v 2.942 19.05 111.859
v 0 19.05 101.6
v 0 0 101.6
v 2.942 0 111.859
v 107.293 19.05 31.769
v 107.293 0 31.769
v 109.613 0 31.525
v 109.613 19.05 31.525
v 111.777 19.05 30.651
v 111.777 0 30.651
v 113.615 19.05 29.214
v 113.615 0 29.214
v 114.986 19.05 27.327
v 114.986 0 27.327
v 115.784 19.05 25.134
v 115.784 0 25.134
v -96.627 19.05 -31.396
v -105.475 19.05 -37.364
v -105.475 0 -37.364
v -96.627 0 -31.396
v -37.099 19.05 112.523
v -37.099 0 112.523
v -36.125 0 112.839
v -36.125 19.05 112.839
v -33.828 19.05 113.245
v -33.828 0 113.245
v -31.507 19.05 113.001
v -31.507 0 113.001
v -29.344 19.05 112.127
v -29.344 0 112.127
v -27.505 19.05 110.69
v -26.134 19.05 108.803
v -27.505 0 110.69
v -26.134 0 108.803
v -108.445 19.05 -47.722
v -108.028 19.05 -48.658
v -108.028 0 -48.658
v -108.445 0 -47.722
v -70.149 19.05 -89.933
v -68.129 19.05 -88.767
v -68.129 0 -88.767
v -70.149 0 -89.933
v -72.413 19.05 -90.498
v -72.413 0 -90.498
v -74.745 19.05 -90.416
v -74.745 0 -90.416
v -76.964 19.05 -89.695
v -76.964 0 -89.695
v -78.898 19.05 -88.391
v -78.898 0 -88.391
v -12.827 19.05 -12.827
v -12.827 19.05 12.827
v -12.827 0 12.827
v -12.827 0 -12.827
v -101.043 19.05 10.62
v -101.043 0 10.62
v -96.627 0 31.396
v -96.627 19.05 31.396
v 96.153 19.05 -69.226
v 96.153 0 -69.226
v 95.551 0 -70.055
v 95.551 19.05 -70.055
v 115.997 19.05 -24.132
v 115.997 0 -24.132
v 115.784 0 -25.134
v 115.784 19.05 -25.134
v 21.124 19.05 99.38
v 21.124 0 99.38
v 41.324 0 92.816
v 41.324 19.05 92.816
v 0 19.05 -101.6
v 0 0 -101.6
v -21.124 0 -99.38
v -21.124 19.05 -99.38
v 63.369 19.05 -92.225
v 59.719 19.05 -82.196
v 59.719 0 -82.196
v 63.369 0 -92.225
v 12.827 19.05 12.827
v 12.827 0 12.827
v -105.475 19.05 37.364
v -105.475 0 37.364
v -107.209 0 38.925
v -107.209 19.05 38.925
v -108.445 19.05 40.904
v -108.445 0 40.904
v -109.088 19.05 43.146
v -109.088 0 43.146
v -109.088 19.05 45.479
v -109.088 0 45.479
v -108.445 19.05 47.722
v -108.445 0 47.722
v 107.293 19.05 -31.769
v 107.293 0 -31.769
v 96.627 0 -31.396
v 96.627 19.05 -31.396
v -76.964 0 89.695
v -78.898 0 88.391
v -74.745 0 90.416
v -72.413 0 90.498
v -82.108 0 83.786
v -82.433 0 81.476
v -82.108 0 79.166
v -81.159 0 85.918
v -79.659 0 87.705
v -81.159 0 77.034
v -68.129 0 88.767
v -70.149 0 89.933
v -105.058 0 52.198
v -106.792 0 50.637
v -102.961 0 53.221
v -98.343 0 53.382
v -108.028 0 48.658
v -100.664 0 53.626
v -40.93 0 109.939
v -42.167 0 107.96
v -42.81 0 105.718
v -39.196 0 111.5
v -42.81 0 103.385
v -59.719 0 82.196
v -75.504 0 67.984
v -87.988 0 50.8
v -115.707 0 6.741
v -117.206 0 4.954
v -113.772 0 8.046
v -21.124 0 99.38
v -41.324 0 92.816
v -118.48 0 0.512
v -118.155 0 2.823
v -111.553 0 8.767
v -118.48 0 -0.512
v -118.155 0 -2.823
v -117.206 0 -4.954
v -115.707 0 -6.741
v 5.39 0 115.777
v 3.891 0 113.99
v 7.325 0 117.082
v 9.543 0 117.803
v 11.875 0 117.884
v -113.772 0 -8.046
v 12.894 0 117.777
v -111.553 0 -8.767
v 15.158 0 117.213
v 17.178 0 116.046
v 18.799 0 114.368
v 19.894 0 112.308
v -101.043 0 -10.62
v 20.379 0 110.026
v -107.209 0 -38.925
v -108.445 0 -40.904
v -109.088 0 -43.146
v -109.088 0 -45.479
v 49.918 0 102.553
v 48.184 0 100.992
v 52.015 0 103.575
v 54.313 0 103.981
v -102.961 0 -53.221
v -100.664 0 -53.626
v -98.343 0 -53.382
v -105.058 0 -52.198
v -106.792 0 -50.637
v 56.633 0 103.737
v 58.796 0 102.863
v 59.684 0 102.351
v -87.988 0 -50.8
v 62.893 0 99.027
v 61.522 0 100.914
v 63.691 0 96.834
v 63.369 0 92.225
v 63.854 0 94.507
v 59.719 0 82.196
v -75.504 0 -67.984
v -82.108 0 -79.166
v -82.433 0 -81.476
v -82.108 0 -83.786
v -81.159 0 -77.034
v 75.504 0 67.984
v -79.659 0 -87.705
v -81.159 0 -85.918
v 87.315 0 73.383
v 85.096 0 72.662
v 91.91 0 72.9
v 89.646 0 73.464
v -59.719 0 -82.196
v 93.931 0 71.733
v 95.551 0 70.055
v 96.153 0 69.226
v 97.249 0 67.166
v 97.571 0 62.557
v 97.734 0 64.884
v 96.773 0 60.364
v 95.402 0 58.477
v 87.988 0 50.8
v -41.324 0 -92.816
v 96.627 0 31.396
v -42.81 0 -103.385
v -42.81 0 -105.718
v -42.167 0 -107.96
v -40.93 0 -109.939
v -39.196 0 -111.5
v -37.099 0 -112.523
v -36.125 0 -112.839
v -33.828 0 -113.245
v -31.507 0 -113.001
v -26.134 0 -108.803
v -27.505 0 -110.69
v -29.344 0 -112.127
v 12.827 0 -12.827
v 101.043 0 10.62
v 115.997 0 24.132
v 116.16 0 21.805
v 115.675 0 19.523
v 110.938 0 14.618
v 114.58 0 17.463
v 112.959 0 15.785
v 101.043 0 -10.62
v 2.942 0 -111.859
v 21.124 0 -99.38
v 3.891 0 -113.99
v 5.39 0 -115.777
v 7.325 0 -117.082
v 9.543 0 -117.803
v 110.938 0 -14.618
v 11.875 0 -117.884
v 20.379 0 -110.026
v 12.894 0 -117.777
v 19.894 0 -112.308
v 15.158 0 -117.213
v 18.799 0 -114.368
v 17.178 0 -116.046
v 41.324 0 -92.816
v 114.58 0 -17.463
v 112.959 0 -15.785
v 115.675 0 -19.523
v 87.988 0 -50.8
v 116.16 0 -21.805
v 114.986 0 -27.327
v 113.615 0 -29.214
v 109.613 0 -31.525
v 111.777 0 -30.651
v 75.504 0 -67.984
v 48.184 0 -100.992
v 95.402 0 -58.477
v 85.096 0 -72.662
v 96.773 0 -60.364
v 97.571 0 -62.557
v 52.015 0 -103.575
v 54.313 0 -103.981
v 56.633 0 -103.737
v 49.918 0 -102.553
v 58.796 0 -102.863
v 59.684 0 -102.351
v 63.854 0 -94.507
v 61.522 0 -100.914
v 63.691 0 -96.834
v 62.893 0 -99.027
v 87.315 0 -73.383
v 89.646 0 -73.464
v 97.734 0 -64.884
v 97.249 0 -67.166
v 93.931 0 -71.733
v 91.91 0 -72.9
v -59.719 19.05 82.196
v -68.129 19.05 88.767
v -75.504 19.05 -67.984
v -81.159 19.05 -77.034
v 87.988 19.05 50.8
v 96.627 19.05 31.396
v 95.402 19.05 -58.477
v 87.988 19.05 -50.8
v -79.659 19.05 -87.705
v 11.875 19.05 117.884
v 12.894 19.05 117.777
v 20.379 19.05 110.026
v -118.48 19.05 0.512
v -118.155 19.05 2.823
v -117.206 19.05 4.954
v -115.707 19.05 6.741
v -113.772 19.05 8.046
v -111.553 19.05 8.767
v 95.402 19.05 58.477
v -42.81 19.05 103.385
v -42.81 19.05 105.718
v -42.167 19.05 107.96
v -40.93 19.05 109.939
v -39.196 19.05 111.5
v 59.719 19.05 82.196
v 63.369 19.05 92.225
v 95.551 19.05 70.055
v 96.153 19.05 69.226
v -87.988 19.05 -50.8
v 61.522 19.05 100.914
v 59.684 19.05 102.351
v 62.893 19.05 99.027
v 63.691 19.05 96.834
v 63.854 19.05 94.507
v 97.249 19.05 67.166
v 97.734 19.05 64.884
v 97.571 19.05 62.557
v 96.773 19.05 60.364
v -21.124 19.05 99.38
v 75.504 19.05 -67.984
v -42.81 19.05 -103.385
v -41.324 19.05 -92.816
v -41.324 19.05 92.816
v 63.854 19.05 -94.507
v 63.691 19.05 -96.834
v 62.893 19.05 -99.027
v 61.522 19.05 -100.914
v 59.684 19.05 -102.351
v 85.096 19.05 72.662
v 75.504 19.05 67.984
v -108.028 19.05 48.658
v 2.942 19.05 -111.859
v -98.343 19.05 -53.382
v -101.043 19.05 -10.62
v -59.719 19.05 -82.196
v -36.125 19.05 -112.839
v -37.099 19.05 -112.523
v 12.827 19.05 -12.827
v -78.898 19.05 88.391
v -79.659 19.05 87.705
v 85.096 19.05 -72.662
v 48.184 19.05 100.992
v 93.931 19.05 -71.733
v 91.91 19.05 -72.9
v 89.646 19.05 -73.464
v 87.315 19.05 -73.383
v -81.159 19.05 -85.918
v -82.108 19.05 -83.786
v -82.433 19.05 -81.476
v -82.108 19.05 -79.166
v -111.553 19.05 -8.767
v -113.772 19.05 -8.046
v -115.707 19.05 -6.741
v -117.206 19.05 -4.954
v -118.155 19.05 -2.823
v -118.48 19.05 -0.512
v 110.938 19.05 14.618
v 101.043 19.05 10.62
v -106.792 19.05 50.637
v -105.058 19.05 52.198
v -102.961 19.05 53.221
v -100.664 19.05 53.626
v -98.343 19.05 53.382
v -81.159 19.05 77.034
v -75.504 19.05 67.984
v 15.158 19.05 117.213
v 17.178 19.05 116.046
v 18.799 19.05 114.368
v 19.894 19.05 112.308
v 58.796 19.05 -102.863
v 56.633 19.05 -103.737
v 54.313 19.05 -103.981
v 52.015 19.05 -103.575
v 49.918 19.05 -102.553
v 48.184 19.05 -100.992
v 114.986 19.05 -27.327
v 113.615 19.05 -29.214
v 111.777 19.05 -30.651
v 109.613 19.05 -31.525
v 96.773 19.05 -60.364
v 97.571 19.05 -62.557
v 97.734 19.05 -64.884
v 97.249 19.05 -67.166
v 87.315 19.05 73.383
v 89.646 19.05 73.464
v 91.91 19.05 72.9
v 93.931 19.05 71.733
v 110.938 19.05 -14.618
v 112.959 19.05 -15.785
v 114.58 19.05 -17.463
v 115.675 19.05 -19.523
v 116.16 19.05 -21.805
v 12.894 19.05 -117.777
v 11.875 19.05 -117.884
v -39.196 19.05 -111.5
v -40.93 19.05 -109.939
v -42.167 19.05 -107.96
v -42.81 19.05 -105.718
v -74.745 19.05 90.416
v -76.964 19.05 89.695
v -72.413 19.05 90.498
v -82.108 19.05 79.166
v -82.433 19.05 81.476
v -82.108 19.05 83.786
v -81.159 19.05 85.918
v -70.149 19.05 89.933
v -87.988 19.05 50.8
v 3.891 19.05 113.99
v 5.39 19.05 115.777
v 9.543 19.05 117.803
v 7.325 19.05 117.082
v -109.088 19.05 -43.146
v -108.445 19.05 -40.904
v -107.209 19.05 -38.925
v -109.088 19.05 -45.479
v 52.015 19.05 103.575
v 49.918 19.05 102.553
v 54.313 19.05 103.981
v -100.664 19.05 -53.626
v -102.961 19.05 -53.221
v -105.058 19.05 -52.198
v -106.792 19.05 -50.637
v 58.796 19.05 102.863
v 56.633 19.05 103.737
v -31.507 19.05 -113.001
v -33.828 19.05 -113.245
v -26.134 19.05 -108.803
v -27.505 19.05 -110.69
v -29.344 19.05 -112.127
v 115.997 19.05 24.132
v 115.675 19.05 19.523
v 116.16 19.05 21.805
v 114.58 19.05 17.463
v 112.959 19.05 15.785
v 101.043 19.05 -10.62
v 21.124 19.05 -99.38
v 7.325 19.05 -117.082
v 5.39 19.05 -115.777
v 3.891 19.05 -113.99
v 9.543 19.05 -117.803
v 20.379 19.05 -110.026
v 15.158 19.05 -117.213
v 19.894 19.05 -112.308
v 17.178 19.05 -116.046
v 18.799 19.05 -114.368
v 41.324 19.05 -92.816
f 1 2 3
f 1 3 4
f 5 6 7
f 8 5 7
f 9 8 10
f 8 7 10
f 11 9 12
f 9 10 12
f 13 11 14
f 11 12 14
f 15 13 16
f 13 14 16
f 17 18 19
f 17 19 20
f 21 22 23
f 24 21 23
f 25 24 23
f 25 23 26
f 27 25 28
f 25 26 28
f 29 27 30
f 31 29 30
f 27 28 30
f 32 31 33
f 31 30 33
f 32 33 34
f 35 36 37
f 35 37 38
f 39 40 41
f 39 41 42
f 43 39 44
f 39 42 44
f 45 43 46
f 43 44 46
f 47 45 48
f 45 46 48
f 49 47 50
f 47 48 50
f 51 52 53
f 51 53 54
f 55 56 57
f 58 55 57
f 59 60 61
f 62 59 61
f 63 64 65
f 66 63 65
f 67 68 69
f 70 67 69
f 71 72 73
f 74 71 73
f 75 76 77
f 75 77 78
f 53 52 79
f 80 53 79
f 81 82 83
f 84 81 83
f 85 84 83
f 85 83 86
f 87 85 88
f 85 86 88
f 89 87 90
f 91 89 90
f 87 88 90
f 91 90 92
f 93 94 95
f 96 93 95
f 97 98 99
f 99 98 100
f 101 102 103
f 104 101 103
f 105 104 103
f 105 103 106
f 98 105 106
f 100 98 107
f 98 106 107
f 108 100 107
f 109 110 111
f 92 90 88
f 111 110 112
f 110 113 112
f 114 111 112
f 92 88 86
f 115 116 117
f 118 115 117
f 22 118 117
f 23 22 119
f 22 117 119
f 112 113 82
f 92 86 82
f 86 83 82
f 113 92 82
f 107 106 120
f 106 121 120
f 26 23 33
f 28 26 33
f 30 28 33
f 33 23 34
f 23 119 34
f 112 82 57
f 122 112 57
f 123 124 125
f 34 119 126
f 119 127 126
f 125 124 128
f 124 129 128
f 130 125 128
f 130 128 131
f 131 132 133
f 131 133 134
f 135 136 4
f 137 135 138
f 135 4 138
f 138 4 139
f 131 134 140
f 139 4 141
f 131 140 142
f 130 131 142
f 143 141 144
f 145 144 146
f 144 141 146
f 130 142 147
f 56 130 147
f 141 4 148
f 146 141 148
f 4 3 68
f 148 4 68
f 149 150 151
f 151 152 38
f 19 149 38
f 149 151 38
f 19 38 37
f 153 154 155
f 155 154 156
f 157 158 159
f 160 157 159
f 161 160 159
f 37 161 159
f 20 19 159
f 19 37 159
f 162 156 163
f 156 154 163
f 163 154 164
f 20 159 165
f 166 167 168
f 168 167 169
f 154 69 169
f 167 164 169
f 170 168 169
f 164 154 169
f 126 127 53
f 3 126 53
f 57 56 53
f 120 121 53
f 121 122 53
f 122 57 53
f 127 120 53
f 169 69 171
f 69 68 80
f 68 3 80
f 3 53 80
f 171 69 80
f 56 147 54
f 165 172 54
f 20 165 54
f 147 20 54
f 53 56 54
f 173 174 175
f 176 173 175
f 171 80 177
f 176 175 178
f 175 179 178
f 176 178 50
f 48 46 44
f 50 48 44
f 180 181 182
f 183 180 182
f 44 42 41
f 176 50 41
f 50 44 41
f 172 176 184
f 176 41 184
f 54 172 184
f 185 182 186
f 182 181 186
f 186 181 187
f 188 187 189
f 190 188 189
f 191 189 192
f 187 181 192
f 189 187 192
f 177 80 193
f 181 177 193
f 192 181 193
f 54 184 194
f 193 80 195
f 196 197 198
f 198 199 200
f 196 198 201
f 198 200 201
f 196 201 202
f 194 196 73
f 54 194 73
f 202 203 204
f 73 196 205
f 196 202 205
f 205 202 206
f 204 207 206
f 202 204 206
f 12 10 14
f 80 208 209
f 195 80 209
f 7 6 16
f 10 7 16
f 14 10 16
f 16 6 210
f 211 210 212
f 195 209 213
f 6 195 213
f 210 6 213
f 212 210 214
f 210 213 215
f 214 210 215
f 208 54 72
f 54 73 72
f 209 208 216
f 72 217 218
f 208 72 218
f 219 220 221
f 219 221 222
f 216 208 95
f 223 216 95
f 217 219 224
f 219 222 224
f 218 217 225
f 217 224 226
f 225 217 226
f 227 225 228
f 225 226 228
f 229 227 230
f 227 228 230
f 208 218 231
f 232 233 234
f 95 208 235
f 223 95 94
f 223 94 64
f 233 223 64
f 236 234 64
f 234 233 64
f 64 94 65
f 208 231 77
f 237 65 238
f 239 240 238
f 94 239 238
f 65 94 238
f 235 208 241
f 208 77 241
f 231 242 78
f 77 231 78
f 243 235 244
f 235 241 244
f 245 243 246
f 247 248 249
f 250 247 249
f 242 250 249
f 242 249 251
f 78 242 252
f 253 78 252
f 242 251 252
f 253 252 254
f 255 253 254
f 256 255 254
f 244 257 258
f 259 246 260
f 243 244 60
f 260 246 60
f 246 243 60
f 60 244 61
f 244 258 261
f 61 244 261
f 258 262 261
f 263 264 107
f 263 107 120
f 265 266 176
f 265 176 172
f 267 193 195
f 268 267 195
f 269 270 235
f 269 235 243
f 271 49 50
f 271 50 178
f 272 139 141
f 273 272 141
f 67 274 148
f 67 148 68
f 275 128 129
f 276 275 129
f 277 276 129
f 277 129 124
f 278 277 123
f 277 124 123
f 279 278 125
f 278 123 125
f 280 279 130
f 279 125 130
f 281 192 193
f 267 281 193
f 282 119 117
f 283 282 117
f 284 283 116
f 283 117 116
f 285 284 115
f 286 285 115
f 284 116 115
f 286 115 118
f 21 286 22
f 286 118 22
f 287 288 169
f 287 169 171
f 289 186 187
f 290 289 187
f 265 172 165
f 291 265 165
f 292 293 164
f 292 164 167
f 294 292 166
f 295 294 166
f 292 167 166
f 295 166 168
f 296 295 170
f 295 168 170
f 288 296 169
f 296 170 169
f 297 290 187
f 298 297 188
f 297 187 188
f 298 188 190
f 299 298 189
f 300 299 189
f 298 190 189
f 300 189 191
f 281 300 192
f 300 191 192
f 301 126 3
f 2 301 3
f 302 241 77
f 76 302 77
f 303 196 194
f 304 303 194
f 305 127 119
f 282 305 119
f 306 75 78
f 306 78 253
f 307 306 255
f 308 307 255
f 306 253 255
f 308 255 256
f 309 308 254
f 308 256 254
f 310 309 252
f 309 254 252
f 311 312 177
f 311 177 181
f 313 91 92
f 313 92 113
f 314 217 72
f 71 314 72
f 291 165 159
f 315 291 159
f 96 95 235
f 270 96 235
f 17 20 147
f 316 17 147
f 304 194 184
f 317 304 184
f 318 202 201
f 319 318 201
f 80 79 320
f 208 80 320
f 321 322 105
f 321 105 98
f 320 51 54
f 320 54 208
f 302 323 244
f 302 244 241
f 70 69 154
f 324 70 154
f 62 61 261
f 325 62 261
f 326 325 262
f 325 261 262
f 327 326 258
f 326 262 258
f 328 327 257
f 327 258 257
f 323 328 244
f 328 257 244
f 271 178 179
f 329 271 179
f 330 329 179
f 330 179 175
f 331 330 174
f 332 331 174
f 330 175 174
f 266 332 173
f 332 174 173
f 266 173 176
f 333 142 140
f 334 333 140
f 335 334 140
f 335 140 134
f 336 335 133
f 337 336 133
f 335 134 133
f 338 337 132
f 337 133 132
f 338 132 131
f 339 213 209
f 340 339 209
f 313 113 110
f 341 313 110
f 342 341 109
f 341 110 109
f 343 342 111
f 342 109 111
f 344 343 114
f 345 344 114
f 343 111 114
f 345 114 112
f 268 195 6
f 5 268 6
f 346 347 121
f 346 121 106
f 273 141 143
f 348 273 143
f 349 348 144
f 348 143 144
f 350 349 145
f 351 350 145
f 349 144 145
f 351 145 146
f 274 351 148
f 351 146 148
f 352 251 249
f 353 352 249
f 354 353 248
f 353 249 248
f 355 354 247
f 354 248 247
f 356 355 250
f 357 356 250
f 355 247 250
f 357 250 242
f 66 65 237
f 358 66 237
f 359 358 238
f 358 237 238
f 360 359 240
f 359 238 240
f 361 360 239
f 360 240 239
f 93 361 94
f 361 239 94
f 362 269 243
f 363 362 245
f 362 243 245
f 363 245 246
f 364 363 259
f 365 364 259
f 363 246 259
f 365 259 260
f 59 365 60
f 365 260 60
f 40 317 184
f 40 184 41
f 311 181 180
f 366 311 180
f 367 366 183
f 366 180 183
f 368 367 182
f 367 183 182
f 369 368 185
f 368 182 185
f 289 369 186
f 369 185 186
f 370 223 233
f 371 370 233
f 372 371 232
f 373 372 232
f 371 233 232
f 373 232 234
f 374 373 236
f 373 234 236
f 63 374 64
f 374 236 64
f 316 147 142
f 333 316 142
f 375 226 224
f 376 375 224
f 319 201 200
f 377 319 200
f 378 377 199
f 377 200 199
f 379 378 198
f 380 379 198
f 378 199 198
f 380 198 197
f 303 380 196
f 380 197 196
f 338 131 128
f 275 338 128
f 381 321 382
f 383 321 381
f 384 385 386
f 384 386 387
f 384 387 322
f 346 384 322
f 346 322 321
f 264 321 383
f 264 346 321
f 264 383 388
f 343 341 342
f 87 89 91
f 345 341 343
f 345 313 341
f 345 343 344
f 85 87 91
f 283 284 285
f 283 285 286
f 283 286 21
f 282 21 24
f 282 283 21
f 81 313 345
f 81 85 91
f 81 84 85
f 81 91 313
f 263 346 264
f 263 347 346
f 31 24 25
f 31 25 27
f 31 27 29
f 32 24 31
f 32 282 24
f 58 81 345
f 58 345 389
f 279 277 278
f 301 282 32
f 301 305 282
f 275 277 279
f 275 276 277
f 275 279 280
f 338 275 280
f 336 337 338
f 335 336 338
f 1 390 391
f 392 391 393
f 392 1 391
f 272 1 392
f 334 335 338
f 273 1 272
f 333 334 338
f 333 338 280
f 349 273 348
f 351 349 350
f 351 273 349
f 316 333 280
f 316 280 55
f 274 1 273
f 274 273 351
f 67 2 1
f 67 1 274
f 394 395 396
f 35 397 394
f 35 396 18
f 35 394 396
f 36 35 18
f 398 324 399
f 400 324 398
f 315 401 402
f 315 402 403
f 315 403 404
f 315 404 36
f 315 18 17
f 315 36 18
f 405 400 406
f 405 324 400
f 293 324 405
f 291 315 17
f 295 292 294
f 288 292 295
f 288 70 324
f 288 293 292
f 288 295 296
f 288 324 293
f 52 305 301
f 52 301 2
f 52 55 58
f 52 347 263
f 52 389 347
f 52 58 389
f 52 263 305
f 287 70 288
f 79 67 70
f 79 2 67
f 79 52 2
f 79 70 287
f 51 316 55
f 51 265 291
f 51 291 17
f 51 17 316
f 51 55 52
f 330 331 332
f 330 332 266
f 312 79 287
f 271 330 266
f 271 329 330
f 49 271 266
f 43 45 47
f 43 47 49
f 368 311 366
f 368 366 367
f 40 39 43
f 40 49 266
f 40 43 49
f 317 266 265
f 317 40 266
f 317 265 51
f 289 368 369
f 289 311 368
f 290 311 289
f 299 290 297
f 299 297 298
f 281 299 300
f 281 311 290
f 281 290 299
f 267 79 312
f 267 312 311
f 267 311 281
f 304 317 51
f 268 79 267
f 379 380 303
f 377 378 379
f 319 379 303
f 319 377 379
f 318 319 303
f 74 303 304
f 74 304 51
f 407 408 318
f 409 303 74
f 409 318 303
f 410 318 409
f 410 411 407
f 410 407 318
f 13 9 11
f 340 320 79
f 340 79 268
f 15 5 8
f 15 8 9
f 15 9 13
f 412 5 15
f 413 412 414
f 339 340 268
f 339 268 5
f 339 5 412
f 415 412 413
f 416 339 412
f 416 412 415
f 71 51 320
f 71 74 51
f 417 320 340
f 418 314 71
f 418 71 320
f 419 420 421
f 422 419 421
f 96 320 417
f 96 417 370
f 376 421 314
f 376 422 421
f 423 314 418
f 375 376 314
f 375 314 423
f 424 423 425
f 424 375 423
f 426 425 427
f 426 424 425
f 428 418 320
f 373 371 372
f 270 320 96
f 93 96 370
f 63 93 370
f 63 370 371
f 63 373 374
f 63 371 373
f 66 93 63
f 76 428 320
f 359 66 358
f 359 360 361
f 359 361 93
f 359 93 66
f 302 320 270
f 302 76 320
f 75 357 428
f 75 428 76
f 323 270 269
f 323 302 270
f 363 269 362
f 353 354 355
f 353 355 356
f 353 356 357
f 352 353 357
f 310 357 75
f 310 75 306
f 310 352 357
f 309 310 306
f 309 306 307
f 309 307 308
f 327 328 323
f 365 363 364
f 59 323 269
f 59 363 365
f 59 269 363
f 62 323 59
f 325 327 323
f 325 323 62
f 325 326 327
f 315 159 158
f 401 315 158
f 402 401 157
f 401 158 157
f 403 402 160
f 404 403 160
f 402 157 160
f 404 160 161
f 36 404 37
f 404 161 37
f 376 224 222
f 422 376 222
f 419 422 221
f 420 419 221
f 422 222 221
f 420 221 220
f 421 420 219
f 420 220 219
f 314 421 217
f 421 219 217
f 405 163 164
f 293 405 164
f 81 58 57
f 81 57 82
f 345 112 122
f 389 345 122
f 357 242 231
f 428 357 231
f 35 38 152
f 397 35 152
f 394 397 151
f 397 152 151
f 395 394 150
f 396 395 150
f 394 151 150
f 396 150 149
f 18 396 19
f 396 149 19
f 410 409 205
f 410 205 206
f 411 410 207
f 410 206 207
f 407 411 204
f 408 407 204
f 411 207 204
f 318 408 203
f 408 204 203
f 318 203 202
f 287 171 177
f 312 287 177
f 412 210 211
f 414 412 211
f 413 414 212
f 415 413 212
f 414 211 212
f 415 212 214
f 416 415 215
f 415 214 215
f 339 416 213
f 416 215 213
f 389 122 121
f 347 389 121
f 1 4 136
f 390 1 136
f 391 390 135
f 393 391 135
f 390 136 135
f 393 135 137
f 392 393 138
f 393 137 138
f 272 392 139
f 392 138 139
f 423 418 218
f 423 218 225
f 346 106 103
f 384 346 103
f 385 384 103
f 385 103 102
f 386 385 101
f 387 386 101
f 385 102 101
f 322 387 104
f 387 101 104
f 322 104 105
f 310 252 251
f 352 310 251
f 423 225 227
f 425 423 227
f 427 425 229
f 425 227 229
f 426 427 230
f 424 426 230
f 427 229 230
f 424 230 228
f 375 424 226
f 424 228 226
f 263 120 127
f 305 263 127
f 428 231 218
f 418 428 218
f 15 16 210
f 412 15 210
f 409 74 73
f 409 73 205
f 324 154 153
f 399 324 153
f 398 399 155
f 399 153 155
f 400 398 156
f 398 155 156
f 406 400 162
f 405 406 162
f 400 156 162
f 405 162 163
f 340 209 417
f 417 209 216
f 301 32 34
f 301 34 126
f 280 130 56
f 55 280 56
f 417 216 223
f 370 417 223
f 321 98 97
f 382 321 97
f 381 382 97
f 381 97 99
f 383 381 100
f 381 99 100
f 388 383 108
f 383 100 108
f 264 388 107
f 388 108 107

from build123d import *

# Parameters (mm, degrees)
BOSS_EXTRUDE1_DEPTH = 19.05
SKETCH2_R           = 3.175
CUT_EXTRUDE1_DEPTH  = 169.2497345
SKETCH4_W           = 25.654
SKETCH4_H           = 25.654
CUT_EXTRUDE2_DEPTH  = 169.2497345


with BuildPart() as part:
    # Sketch1 → Boss-Extrude1 (new body)
    with BuildSketch(Plane(origin=(0, 0, 0), x_dir=(1, 0, 0), z_dir=(0, 1, 0))):
        with BuildLine():
            Line((41.324442937, 92.816218496), (0, 0))
            Line((0, 0), (0, 101.6))
            Line((0, 101.6), (-21.123827787, 99.379796235))
            Line((-21.123827787, 99.379796235), (-26.134113546, 108.80277326))
            ThreePointArc((-26.134113546, 108.80277326), (-30.395027803, 112.639317689), (-36.125160716, 112.83941834))
            Line((-36.125160716, 112.83941834), (-37.099477034, 112.522843778))
            ThreePointArc((-37.099477034, 112.522843778), (-41.617635729, 108.992871331), (-42.809723539, 103.384539126))
            Line((-42.809723539, 103.384539126), (-41.324442937, 92.816218496))
            Line((-41.324442937, 92.816218496), (-59.718981633, 82.196126628))
            Line((-59.718981633, 82.196126628), (-68.128775472, 88.766577677))
            ThreePointArc((-68.128775472, 88.766577677), (-73.58177754, 90.538365452), (-78.897902701, 88.390511467))
            Line((-78.897902701, 88.390511467), (-79.659222473, 87.705016066))
            ThreePointArc((-79.659222473, 87.705016066), (-82.350996682, 82.642525071), (-81.158908872, 77.034192866))
            Line((-81.158908872, 77.034192866), (-75.503514269, 67.983669606))
            Line((-75.503514269, 67.983669606), (-87.988181024, 50.8))
            Line((-87.988181024, 50.8), (-98.343353189, 53.381834395))
            ThreePointArc((-98.343353189, 53.381834395), (-104.04556947, 52.782507313), (-108.028480544, 48.658082159))
            Line((-108.028480544, 48.658082159), (-108.445164665, 47.722194301))
            ThreePointArc((-108.445164665, 47.722194301), (-108.845122174, 42.002535442), (-105.474981556, 37.363934825))
            Line((-105.474981556, 37.363934825), (-96.627342056, 31.396126628))
            Line((-96.627342056, 31.396126628), (-101.043424569, 10.620091868))
            Line((-101.043424569, 10.620091868), (-111.553471718, 8.766886987))
            ThreePointArc((-111.553471718, 8.766886987), (-116.518937215, 5.900074146), (-118.479952693, 0.512228401))
            Line((-118.479952693, 0.512228401), (-118.479952693, -0.512228401))
            ThreePointArc((-118.479952693, -0.512228401), (-116.518937215, -5.900074146), (-111.553471718, -8.766886987))
            Line((-111.553471718, -8.766886987), (-101.043424569, -10.620091868))
            Line((-101.043424569, -10.620091868), (-96.627342056, -31.396126628))
            Line((-96.627342056, -31.396126628), (-105.474981556, -37.363934825))
            ThreePointArc((-105.474981556, -37.363934825), (-108.845122174, -42.002535442), (-108.445164665, -47.722194301))
            Line((-108.445164665, -47.722194301), (-108.028480544, -48.658082159))
            ThreePointArc((-108.028480544, -48.658082159), (-104.04556947, -52.782507313), (-98.343353189, -53.381834395))
            Line((-98.343353189, -53.381834395), (-87.988181024, -50.8))
            Line((-87.988181024, -50.8), (-75.503514269, -67.983669606))
            Line((-75.503514269, -67.983669606), (-81.158908872, -77.034192866))
            ThreePointArc((-81.158908872, -77.034192866), (-82.350996682, -82.642525071), (-79.659222473, -87.705016066))
            Line((-79.659222473, -87.705016066), (-78.897902701, -88.390511467))
            ThreePointArc((-78.897902701, -88.390511467), (-73.58177754, -90.538365452), (-68.128775472, -88.766577677))
            Line((-68.128775472, -88.766577677), (-59.718981633, -82.196126628))
            Line((-59.718981633, -82.196126628), (-41.324442937, -92.816218496))
            Line((-41.324442937, -92.816218496), (-42.809723539, -103.384539126))
            ThreePointArc((-42.809723539, -103.384539126), (-41.617635729, -108.992871331), (-37.099477034, -112.522843778))
            Line((-37.099477034, -112.522843778), (-36.125160716, -112.83941834))
            ThreePointArc((-36.125160716, -112.83941834), (-30.395027803, -112.639317689), (-26.134113546, -108.80277326))
            Line((-26.134113546, -108.80277326), (-21.123827787, -99.379796235))
            Line((-21.123827787, -99.379796235), (0, -101.6))
            Line((0, -101.6), (2.941651908, -111.858759352))
            ThreePointArc((2.941651908, -111.858759352), (6.311792526, -116.497359969), (11.875105022, -117.884449563))
            Line((11.875105022, -117.884449563), (12.893949744, -117.777364667))
            ThreePointArc((12.893949744, -117.777364667), (18.047298371, -115.263908602), (20.379374034, -110.025980903))
            Line((20.379374034, -110.025980903), (21.123827787, -99.379796235))
            Line((21.123827787, -99.379796235), (41.324442937, -92.816218496))
            Line((41.324442937, -92.816218496), (48.184389016, -100.991583882))
            ThreePointArc((48.184389016, -100.991583882), (53.149854513, -103.858396723), (58.796373538, -102.862763072))
            Line((58.796373538, -102.862763072), (59.683579155, -102.35053467))
            ThreePointArc((59.683579155, -102.35053467), (63.369082702, -97.958322577), (63.369082702, -92.224696894))
            Line((63.369082702, -92.224696894), (59.718981633, -82.196126628))
            Line((59.718981633, -82.196126628), (75.503514269, -67.983669606))
            Line((75.503514269, -67.983669606), (85.095607522, -72.662046078))
            ThreePointArc((85.095607522, -72.662046078), (90.797823803, -73.26137316), (95.551214921, -70.055170367))
            Line((95.551214921, -70.055170367), (96.153375521, -69.226367403))
            ThreePointArc((96.153375521, -69.226367403), (97.733776944, -63.714852656), (95.401701281, -58.476924957))
            Line((95.401701281, -58.476924957), (87.988181024, -50.8))
            Line((87.988181024, -50.8), (96.627342056, -31.396126628))
            Line((96.627342056, -31.396126628), (107.293022418, -31.768580394))
            ThreePointArc((107.293022418, -31.768580394), (112.746024485, -29.996792619), (115.784383188, -25.134402274))
            Line((115.784383188, -25.134402274), (115.997379734, -24.13233231))
            ThreePointArc((115.997379734, -24.13233231), (115.199413268, -18.454505879), (110.938499011, -14.617961449))
            Line((110.938499011, -14.617961449), (101.043424569, -10.620091868))
            Line((101.043424569, -10.620091868), (101.043424569, 10.620091868))
            Line((101.043424569, 10.620091868), (110.938499011, 14.617961449))
            ThreePointArc((110.938499011, 14.617961449), (115.199413268, 18.454505879), (115.997379734, 24.13233231))
            Line((115.997379734, 24.13233231), (115.784383188, 25.134402274))
            ThreePointArc((115.784383188, 25.134402274), (112.746024485, 29.996792619), (107.293022418, 31.768580394))
            Line((107.293022418, 31.768580394), (96.627342056, 31.396126628))
            Line((96.627342056, 31.396126628), (87.988181024, 50.8))
            Line((87.988181024, 50.8), (95.401701281, 58.476924957))
            ThreePointArc((95.401701281, 58.476924957), (97.733776944, 63.714852656), (96.153375521, 69.226367403))
            Line((96.153375521, 69.226367403), (95.551214921, 70.055170367))
            ThreePointArc((95.551214921, 70.055170367), (90.797823803, 73.26137316), (85.095607522, 72.662046078))
            Line((85.095607522, 72.662046078), (75.503514269, 67.983669606))
            Line((75.503514269, 67.983669606), (59.718981633, 82.196126628))
            Line((59.718981633, 82.196126628), (63.369082702, 92.224696894))
            ThreePointArc((63.369082702, 92.224696894), (63.369082702, 97.958322577), (59.683579155, 102.35053467))
            Line((59.683579155, 102.35053467), (58.796373538, 102.862763072))
            ThreePointArc((58.796373538, 102.862763072), (53.149854513, 103.858396723), (48.184389016, 100.991583882))
            Line((48.184389016, 100.991583882), (41.324442937, 92.816218496))
        make_face()
        with BuildLine():
            Line((0, 101.6), (0, 0))
            Line((0, 0), (21.123827787, 99.379796235))
            Line((21.123827787, 99.379796235), (20.379374034, 110.025980903))
            ThreePointArc((20.379374034, 110.025980903), (18.047298371, 115.263908602), (12.893949744, 117.777364667))
            Line((12.893949744, 117.777364667), (11.875105022, 117.884449563))
            ThreePointArc((11.875105022, 117.884449563), (6.311792526, 116.497359969), (2.941651908, 111.858759352))
            Line((2.941651908, 111.858759352), (0, 101.6))
        make_face()
        Polygon((21.123827787, 99.379796235), (0, 0), (41.324442937, 92.816218496), align=None)
    extrude(amount=BOSS_EXTRUDE1_DEPTH)

    # Sketch2 → Cut-Extrude1 (cut, through all)
    with BuildSketch(Plane(origin=(0, 19.05, 0), x_dir=(1, 0, 0), z_dir=(0, 1, 0))):
        with Locations(Location((0, 0, 0), (0, 0, 270))):
            Circle(SKETCH2_R)
    extrude(amount=-CUT_EXTRUDE1_DEPTH, mode=Mode.SUBTRACT)

    # Sketch4 → Cut-Extrude2 (cut, through all)
    with BuildSketch(Plane(origin=(0, 19.05, 0), x_dir=(1, 0, 0), z_dir=(0, 1, 0))):
        Rectangle(SKETCH4_W, SKETCH4_H)
    extrude(amount=-CUT_EXTRUDE2_DEPTH, mode=Mode.SUBTRACT)


solid = part.part
